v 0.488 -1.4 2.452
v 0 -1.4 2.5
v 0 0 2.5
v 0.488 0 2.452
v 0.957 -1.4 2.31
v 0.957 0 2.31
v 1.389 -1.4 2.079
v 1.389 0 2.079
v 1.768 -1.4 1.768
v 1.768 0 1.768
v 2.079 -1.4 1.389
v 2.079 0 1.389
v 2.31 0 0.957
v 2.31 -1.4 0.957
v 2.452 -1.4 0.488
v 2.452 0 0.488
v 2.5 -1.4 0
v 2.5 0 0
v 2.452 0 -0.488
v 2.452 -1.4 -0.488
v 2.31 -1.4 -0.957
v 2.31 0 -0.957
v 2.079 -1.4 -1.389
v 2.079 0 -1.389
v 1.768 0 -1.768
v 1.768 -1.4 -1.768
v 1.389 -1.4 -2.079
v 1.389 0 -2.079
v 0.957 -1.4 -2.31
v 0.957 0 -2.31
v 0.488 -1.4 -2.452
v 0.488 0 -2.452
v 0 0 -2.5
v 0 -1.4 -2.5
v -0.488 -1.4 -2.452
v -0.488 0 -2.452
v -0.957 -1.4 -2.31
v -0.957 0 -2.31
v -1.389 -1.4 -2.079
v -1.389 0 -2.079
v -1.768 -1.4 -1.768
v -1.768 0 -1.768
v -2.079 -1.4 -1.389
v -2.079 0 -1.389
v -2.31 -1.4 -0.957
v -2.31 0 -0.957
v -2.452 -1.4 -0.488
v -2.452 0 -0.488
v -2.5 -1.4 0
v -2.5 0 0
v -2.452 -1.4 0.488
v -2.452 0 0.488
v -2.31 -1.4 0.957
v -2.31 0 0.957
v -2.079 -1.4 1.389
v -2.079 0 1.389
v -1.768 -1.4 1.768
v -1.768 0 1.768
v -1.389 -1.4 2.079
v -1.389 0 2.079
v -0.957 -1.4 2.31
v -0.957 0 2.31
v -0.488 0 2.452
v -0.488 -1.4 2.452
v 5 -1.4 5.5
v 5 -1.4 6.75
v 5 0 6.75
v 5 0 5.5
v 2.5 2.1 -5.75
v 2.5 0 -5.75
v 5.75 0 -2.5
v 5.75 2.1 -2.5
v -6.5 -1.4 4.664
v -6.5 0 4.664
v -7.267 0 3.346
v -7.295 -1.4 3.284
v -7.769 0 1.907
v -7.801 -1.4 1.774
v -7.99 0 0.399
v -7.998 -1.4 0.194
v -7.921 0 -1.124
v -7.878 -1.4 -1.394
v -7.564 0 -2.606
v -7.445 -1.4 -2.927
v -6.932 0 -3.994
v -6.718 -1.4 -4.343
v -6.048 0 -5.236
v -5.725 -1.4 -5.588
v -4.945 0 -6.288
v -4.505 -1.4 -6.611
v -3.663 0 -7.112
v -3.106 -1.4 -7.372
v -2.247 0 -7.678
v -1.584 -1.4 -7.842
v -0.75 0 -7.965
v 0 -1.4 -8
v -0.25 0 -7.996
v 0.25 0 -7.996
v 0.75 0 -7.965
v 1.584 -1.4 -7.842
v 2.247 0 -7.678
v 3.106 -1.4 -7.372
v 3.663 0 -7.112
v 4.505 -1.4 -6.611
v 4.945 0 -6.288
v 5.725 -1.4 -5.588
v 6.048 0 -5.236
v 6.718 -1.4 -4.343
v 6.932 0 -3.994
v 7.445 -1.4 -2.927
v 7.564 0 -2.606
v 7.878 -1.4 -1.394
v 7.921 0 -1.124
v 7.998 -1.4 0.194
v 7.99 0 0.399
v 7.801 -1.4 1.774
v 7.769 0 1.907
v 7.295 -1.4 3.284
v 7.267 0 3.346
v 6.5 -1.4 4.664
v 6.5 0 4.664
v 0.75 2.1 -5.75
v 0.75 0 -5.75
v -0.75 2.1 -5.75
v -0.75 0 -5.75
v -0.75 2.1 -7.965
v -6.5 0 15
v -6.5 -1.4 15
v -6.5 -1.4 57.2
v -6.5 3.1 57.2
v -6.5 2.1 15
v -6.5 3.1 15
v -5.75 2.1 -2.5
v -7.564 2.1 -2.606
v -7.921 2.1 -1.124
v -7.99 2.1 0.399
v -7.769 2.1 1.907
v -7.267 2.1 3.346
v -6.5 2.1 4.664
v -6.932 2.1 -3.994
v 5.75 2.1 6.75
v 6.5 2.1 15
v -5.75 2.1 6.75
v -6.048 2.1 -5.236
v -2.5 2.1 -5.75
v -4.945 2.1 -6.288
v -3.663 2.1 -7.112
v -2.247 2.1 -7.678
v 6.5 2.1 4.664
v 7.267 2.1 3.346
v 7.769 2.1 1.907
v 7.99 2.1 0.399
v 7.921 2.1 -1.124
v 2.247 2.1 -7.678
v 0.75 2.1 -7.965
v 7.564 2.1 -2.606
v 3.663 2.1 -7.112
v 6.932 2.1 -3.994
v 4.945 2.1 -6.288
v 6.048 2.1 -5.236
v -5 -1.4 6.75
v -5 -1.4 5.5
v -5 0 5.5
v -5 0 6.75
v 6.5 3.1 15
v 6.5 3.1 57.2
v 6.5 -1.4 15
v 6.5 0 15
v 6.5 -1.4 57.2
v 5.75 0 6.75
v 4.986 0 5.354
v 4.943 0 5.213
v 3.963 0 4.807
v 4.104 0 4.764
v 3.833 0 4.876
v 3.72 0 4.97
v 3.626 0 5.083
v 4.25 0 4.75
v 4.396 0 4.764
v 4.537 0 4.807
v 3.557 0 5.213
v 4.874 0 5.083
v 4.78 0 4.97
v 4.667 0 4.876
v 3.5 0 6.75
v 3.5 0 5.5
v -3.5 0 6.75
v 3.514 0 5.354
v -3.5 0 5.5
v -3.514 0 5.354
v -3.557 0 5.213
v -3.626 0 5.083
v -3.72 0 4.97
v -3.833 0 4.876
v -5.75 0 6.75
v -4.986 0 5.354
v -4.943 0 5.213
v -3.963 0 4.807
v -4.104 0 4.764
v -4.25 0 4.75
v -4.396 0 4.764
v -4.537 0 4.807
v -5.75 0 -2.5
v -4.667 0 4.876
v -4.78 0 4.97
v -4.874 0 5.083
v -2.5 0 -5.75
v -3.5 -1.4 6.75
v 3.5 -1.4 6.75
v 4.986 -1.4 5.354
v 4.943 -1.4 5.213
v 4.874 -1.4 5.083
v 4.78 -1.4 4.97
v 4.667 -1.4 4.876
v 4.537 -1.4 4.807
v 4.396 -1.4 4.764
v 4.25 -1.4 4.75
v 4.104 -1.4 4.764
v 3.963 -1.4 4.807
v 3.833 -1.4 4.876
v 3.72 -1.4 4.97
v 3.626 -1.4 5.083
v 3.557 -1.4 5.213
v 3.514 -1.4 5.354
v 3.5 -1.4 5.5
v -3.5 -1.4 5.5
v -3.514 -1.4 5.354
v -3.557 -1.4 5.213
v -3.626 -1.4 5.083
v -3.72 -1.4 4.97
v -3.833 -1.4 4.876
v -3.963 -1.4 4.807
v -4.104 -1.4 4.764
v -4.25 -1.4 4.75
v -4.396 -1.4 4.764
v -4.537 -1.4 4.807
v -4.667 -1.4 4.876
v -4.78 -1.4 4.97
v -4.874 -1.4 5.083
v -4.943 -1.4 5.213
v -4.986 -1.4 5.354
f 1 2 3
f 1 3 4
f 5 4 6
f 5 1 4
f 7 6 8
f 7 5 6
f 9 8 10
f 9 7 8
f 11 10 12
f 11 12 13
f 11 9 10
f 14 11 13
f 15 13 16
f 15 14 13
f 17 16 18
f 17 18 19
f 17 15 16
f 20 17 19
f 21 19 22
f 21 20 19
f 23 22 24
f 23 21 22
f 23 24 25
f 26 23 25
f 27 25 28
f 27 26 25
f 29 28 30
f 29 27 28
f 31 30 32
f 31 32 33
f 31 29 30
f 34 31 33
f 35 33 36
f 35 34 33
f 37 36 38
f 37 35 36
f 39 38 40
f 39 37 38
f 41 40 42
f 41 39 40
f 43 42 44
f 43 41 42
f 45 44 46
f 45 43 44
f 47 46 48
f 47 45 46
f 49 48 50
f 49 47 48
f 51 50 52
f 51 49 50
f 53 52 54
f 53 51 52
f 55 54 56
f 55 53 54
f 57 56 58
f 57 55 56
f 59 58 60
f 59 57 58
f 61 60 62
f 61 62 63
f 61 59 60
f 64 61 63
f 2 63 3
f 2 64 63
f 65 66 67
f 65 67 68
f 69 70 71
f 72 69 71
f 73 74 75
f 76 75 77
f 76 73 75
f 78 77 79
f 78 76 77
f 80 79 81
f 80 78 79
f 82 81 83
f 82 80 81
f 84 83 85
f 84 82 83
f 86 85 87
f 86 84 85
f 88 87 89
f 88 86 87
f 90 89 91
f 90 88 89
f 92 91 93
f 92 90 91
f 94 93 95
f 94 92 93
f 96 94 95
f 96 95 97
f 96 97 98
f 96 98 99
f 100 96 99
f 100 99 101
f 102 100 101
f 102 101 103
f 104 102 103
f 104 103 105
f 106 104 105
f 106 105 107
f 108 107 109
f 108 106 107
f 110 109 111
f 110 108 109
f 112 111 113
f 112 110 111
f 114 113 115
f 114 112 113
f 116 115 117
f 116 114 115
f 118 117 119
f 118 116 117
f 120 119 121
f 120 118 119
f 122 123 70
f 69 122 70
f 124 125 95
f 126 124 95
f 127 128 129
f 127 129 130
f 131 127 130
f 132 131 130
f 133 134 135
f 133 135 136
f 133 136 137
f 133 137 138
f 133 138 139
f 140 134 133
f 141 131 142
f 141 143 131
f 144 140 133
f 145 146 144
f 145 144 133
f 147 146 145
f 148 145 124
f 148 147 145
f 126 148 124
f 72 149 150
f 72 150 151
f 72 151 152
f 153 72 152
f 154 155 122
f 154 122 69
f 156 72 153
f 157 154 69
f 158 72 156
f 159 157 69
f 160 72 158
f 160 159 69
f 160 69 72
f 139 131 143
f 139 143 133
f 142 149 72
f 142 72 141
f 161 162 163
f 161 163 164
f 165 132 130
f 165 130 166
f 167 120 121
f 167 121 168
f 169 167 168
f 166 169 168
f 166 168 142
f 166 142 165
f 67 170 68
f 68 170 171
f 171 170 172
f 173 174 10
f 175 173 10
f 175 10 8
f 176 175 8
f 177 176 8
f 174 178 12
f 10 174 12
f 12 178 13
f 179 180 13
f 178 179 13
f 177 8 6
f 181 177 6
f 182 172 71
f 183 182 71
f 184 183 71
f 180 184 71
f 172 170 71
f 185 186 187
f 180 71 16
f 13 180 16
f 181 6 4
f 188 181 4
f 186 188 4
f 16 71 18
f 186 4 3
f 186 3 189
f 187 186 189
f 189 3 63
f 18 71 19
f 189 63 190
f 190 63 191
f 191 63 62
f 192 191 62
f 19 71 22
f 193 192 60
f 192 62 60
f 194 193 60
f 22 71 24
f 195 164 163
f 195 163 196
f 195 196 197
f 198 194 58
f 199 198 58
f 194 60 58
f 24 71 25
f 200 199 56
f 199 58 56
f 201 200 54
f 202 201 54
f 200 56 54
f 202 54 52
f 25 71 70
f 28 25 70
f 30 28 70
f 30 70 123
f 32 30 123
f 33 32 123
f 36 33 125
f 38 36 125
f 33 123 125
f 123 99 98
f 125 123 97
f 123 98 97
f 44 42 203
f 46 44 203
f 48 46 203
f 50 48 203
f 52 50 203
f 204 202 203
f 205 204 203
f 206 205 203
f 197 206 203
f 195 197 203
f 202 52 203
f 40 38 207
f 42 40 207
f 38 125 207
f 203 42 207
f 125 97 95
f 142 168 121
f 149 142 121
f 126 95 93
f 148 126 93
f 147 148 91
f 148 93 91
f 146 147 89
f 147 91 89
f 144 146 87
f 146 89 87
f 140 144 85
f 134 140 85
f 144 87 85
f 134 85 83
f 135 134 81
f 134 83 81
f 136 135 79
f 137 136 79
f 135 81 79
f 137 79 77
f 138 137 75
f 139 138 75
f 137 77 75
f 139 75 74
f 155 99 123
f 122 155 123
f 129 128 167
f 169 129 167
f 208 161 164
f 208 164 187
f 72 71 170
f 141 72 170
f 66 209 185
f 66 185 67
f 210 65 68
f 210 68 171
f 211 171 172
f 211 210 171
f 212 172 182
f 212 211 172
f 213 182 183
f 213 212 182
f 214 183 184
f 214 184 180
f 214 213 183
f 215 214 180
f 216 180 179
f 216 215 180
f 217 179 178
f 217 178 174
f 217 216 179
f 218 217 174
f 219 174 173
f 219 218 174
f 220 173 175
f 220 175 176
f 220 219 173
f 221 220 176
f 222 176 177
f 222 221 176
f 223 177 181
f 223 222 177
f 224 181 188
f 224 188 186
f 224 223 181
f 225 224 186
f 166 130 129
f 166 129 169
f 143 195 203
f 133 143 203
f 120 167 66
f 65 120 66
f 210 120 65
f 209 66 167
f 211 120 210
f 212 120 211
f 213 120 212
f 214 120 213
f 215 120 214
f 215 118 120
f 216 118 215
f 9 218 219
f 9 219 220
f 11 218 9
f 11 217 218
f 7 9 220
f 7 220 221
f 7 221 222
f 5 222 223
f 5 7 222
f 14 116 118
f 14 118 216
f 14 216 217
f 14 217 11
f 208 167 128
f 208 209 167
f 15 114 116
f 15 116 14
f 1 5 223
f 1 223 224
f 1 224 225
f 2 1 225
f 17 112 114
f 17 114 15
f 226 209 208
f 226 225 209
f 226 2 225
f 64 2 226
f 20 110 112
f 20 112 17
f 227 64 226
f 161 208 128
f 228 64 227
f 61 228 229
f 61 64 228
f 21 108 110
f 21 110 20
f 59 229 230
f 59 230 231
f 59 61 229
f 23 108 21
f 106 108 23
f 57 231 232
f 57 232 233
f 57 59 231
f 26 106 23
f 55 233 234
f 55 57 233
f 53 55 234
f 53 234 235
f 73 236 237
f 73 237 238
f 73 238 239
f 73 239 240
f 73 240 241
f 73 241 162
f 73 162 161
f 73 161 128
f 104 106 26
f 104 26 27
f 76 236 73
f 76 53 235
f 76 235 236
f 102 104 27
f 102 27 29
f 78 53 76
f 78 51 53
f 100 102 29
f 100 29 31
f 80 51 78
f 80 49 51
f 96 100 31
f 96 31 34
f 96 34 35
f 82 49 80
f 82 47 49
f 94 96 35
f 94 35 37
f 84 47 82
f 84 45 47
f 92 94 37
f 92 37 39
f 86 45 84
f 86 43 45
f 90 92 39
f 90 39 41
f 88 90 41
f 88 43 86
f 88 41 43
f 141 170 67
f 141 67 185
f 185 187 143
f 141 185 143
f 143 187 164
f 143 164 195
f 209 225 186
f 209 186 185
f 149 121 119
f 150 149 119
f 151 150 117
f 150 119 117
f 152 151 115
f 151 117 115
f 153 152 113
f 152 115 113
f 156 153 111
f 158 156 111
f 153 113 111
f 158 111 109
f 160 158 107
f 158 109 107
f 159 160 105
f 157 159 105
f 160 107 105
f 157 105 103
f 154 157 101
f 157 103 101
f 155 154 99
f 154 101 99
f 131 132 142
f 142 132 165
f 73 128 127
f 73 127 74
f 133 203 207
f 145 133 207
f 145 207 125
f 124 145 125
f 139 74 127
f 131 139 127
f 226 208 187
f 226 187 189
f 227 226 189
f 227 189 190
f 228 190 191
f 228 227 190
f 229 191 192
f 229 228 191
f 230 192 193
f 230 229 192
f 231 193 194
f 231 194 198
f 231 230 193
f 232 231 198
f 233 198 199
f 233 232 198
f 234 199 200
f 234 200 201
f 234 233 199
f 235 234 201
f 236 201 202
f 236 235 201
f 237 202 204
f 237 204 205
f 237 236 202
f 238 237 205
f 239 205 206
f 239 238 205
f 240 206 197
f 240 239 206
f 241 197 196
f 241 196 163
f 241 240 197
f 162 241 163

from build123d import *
from build123d.topology import SkipClean

# Parameters (mm, degrees)
BOSS_EXTRUDE1_DEPTH = 2.1
BOSS_EXTRUDE2_START = -1.4
SKETCH2_R           = 2.5
BOSS_EXTRUDE2_DEPTH = 1.4
SKETCH4_W           = 13
SKETCH4_H           = 4.5
BOSS_EXTRUDE3_DEPTH = 42.2


with BuildPart() as part:
    # Sketch1 → Boss-Extrude1 (new body)
    with BuildSketch(Plane(origin=(0, 0, 0), x_dir=(1, 0, 0), z_dir=(0, 1, 0))):
        with BuildLine():
            Line((-5.75, 2.5), (-2.5, 5.75))
            Line((-2.5, 5.75), (-0.75, 5.75))
            Line((-0.75, 5.75), (-0.75, 7.964766161))
            ThreePointArc((-0.75, 7.964766161), (-7.280803408, 3.31510207), (-6.5, -4.663689527))
            Line((-6.5, -4.663689527), (-6.5, -15))
            Line((-6.5, -15), (6.5, -15))
            Line((6.5, -15), (6.5, -4.663689527))
            ThreePointArc((6.5, -4.663689527), (7.280803408, 3.31510207), (0.75, 7.964766161))
            Line((0.75, 7.964766161), (0.75, 5.75))
            Line((0.75, 5.75), (2.5, 5.75))
            Line((2.5, 5.75), (5.75, 2.5))
            Line((5.75, 2.5), (5.75, -6.75))
            Line((5.75, -6.75), (-5.75, -6.75))
            Line((-5.75, -6.75), (-5.75, 2.5))
        make_face()
    extrude(amount=BOSS_EXTRUDE1_DEPTH)

    # Sketch2 → Boss-Extrude2 (add)
    with SkipClean():  # the faces are left unmerged after this step: merging them gives an invalid solid
        with BuildSketch(Plane(origin=(0, 0, 0), x_dir=(1, 0, 0), z_dir=(0, 1, 0)).offset(BOSS_EXTRUDE2_START)):
            with BuildLine():
                Line((6.5, -4.663689527), (6.5, -15))
                Line((6.5, -15), (-6.5, -15))
                Line((-6.5, -15), (-6.5, -4.663689527))
                ThreePointArc((-6.5, -4.663689527), (0, 8), (6.5, -4.663689527))
            make_face()
            with Locations(Location((0, 0, 0), (0, 0, 270))):
                Circle(SKETCH2_R, mode=Mode.SUBTRACT)
            with BuildLine():
                Line((-5, -5.5), (-5, -6.75))
                Line((-5, -6.75), (-3.5, -6.75))
                Line((-3.5, -6.75), (-3.5, -5.5))
                ThreePointArc((-3.5, -5.5), (-4.25, -4.75), (-5, -5.5))
            make_face(mode=Mode.SUBTRACT)
            with BuildLine():
                Line((3.5, -5.5), (3.5, -6.75))
                Line((3.5, -6.75), (5, -6.75))
                Line((5, -6.75), (5, -5.5))
                ThreePointArc((5, -5.5), (4.25, -4.75), (3.5, -5.5))
            make_face(mode=Mode.SUBTRACT)
        extrude(amount=BOSS_EXTRUDE2_DEPTH)

    # Sketch4 → Boss-Extrude3 (add)
    with SkipClean():  # the faces are left unmerged after this step: merging them gives an invalid solid
        with BuildSketch(Plane.XY.offset(15)):
            with Locations((0, 0.85)):
                Rectangle(SKETCH4_W, SKETCH4_H)
        extrude(amount=BOSS_EXTRUDE3_DEPTH)


solid = part.part
